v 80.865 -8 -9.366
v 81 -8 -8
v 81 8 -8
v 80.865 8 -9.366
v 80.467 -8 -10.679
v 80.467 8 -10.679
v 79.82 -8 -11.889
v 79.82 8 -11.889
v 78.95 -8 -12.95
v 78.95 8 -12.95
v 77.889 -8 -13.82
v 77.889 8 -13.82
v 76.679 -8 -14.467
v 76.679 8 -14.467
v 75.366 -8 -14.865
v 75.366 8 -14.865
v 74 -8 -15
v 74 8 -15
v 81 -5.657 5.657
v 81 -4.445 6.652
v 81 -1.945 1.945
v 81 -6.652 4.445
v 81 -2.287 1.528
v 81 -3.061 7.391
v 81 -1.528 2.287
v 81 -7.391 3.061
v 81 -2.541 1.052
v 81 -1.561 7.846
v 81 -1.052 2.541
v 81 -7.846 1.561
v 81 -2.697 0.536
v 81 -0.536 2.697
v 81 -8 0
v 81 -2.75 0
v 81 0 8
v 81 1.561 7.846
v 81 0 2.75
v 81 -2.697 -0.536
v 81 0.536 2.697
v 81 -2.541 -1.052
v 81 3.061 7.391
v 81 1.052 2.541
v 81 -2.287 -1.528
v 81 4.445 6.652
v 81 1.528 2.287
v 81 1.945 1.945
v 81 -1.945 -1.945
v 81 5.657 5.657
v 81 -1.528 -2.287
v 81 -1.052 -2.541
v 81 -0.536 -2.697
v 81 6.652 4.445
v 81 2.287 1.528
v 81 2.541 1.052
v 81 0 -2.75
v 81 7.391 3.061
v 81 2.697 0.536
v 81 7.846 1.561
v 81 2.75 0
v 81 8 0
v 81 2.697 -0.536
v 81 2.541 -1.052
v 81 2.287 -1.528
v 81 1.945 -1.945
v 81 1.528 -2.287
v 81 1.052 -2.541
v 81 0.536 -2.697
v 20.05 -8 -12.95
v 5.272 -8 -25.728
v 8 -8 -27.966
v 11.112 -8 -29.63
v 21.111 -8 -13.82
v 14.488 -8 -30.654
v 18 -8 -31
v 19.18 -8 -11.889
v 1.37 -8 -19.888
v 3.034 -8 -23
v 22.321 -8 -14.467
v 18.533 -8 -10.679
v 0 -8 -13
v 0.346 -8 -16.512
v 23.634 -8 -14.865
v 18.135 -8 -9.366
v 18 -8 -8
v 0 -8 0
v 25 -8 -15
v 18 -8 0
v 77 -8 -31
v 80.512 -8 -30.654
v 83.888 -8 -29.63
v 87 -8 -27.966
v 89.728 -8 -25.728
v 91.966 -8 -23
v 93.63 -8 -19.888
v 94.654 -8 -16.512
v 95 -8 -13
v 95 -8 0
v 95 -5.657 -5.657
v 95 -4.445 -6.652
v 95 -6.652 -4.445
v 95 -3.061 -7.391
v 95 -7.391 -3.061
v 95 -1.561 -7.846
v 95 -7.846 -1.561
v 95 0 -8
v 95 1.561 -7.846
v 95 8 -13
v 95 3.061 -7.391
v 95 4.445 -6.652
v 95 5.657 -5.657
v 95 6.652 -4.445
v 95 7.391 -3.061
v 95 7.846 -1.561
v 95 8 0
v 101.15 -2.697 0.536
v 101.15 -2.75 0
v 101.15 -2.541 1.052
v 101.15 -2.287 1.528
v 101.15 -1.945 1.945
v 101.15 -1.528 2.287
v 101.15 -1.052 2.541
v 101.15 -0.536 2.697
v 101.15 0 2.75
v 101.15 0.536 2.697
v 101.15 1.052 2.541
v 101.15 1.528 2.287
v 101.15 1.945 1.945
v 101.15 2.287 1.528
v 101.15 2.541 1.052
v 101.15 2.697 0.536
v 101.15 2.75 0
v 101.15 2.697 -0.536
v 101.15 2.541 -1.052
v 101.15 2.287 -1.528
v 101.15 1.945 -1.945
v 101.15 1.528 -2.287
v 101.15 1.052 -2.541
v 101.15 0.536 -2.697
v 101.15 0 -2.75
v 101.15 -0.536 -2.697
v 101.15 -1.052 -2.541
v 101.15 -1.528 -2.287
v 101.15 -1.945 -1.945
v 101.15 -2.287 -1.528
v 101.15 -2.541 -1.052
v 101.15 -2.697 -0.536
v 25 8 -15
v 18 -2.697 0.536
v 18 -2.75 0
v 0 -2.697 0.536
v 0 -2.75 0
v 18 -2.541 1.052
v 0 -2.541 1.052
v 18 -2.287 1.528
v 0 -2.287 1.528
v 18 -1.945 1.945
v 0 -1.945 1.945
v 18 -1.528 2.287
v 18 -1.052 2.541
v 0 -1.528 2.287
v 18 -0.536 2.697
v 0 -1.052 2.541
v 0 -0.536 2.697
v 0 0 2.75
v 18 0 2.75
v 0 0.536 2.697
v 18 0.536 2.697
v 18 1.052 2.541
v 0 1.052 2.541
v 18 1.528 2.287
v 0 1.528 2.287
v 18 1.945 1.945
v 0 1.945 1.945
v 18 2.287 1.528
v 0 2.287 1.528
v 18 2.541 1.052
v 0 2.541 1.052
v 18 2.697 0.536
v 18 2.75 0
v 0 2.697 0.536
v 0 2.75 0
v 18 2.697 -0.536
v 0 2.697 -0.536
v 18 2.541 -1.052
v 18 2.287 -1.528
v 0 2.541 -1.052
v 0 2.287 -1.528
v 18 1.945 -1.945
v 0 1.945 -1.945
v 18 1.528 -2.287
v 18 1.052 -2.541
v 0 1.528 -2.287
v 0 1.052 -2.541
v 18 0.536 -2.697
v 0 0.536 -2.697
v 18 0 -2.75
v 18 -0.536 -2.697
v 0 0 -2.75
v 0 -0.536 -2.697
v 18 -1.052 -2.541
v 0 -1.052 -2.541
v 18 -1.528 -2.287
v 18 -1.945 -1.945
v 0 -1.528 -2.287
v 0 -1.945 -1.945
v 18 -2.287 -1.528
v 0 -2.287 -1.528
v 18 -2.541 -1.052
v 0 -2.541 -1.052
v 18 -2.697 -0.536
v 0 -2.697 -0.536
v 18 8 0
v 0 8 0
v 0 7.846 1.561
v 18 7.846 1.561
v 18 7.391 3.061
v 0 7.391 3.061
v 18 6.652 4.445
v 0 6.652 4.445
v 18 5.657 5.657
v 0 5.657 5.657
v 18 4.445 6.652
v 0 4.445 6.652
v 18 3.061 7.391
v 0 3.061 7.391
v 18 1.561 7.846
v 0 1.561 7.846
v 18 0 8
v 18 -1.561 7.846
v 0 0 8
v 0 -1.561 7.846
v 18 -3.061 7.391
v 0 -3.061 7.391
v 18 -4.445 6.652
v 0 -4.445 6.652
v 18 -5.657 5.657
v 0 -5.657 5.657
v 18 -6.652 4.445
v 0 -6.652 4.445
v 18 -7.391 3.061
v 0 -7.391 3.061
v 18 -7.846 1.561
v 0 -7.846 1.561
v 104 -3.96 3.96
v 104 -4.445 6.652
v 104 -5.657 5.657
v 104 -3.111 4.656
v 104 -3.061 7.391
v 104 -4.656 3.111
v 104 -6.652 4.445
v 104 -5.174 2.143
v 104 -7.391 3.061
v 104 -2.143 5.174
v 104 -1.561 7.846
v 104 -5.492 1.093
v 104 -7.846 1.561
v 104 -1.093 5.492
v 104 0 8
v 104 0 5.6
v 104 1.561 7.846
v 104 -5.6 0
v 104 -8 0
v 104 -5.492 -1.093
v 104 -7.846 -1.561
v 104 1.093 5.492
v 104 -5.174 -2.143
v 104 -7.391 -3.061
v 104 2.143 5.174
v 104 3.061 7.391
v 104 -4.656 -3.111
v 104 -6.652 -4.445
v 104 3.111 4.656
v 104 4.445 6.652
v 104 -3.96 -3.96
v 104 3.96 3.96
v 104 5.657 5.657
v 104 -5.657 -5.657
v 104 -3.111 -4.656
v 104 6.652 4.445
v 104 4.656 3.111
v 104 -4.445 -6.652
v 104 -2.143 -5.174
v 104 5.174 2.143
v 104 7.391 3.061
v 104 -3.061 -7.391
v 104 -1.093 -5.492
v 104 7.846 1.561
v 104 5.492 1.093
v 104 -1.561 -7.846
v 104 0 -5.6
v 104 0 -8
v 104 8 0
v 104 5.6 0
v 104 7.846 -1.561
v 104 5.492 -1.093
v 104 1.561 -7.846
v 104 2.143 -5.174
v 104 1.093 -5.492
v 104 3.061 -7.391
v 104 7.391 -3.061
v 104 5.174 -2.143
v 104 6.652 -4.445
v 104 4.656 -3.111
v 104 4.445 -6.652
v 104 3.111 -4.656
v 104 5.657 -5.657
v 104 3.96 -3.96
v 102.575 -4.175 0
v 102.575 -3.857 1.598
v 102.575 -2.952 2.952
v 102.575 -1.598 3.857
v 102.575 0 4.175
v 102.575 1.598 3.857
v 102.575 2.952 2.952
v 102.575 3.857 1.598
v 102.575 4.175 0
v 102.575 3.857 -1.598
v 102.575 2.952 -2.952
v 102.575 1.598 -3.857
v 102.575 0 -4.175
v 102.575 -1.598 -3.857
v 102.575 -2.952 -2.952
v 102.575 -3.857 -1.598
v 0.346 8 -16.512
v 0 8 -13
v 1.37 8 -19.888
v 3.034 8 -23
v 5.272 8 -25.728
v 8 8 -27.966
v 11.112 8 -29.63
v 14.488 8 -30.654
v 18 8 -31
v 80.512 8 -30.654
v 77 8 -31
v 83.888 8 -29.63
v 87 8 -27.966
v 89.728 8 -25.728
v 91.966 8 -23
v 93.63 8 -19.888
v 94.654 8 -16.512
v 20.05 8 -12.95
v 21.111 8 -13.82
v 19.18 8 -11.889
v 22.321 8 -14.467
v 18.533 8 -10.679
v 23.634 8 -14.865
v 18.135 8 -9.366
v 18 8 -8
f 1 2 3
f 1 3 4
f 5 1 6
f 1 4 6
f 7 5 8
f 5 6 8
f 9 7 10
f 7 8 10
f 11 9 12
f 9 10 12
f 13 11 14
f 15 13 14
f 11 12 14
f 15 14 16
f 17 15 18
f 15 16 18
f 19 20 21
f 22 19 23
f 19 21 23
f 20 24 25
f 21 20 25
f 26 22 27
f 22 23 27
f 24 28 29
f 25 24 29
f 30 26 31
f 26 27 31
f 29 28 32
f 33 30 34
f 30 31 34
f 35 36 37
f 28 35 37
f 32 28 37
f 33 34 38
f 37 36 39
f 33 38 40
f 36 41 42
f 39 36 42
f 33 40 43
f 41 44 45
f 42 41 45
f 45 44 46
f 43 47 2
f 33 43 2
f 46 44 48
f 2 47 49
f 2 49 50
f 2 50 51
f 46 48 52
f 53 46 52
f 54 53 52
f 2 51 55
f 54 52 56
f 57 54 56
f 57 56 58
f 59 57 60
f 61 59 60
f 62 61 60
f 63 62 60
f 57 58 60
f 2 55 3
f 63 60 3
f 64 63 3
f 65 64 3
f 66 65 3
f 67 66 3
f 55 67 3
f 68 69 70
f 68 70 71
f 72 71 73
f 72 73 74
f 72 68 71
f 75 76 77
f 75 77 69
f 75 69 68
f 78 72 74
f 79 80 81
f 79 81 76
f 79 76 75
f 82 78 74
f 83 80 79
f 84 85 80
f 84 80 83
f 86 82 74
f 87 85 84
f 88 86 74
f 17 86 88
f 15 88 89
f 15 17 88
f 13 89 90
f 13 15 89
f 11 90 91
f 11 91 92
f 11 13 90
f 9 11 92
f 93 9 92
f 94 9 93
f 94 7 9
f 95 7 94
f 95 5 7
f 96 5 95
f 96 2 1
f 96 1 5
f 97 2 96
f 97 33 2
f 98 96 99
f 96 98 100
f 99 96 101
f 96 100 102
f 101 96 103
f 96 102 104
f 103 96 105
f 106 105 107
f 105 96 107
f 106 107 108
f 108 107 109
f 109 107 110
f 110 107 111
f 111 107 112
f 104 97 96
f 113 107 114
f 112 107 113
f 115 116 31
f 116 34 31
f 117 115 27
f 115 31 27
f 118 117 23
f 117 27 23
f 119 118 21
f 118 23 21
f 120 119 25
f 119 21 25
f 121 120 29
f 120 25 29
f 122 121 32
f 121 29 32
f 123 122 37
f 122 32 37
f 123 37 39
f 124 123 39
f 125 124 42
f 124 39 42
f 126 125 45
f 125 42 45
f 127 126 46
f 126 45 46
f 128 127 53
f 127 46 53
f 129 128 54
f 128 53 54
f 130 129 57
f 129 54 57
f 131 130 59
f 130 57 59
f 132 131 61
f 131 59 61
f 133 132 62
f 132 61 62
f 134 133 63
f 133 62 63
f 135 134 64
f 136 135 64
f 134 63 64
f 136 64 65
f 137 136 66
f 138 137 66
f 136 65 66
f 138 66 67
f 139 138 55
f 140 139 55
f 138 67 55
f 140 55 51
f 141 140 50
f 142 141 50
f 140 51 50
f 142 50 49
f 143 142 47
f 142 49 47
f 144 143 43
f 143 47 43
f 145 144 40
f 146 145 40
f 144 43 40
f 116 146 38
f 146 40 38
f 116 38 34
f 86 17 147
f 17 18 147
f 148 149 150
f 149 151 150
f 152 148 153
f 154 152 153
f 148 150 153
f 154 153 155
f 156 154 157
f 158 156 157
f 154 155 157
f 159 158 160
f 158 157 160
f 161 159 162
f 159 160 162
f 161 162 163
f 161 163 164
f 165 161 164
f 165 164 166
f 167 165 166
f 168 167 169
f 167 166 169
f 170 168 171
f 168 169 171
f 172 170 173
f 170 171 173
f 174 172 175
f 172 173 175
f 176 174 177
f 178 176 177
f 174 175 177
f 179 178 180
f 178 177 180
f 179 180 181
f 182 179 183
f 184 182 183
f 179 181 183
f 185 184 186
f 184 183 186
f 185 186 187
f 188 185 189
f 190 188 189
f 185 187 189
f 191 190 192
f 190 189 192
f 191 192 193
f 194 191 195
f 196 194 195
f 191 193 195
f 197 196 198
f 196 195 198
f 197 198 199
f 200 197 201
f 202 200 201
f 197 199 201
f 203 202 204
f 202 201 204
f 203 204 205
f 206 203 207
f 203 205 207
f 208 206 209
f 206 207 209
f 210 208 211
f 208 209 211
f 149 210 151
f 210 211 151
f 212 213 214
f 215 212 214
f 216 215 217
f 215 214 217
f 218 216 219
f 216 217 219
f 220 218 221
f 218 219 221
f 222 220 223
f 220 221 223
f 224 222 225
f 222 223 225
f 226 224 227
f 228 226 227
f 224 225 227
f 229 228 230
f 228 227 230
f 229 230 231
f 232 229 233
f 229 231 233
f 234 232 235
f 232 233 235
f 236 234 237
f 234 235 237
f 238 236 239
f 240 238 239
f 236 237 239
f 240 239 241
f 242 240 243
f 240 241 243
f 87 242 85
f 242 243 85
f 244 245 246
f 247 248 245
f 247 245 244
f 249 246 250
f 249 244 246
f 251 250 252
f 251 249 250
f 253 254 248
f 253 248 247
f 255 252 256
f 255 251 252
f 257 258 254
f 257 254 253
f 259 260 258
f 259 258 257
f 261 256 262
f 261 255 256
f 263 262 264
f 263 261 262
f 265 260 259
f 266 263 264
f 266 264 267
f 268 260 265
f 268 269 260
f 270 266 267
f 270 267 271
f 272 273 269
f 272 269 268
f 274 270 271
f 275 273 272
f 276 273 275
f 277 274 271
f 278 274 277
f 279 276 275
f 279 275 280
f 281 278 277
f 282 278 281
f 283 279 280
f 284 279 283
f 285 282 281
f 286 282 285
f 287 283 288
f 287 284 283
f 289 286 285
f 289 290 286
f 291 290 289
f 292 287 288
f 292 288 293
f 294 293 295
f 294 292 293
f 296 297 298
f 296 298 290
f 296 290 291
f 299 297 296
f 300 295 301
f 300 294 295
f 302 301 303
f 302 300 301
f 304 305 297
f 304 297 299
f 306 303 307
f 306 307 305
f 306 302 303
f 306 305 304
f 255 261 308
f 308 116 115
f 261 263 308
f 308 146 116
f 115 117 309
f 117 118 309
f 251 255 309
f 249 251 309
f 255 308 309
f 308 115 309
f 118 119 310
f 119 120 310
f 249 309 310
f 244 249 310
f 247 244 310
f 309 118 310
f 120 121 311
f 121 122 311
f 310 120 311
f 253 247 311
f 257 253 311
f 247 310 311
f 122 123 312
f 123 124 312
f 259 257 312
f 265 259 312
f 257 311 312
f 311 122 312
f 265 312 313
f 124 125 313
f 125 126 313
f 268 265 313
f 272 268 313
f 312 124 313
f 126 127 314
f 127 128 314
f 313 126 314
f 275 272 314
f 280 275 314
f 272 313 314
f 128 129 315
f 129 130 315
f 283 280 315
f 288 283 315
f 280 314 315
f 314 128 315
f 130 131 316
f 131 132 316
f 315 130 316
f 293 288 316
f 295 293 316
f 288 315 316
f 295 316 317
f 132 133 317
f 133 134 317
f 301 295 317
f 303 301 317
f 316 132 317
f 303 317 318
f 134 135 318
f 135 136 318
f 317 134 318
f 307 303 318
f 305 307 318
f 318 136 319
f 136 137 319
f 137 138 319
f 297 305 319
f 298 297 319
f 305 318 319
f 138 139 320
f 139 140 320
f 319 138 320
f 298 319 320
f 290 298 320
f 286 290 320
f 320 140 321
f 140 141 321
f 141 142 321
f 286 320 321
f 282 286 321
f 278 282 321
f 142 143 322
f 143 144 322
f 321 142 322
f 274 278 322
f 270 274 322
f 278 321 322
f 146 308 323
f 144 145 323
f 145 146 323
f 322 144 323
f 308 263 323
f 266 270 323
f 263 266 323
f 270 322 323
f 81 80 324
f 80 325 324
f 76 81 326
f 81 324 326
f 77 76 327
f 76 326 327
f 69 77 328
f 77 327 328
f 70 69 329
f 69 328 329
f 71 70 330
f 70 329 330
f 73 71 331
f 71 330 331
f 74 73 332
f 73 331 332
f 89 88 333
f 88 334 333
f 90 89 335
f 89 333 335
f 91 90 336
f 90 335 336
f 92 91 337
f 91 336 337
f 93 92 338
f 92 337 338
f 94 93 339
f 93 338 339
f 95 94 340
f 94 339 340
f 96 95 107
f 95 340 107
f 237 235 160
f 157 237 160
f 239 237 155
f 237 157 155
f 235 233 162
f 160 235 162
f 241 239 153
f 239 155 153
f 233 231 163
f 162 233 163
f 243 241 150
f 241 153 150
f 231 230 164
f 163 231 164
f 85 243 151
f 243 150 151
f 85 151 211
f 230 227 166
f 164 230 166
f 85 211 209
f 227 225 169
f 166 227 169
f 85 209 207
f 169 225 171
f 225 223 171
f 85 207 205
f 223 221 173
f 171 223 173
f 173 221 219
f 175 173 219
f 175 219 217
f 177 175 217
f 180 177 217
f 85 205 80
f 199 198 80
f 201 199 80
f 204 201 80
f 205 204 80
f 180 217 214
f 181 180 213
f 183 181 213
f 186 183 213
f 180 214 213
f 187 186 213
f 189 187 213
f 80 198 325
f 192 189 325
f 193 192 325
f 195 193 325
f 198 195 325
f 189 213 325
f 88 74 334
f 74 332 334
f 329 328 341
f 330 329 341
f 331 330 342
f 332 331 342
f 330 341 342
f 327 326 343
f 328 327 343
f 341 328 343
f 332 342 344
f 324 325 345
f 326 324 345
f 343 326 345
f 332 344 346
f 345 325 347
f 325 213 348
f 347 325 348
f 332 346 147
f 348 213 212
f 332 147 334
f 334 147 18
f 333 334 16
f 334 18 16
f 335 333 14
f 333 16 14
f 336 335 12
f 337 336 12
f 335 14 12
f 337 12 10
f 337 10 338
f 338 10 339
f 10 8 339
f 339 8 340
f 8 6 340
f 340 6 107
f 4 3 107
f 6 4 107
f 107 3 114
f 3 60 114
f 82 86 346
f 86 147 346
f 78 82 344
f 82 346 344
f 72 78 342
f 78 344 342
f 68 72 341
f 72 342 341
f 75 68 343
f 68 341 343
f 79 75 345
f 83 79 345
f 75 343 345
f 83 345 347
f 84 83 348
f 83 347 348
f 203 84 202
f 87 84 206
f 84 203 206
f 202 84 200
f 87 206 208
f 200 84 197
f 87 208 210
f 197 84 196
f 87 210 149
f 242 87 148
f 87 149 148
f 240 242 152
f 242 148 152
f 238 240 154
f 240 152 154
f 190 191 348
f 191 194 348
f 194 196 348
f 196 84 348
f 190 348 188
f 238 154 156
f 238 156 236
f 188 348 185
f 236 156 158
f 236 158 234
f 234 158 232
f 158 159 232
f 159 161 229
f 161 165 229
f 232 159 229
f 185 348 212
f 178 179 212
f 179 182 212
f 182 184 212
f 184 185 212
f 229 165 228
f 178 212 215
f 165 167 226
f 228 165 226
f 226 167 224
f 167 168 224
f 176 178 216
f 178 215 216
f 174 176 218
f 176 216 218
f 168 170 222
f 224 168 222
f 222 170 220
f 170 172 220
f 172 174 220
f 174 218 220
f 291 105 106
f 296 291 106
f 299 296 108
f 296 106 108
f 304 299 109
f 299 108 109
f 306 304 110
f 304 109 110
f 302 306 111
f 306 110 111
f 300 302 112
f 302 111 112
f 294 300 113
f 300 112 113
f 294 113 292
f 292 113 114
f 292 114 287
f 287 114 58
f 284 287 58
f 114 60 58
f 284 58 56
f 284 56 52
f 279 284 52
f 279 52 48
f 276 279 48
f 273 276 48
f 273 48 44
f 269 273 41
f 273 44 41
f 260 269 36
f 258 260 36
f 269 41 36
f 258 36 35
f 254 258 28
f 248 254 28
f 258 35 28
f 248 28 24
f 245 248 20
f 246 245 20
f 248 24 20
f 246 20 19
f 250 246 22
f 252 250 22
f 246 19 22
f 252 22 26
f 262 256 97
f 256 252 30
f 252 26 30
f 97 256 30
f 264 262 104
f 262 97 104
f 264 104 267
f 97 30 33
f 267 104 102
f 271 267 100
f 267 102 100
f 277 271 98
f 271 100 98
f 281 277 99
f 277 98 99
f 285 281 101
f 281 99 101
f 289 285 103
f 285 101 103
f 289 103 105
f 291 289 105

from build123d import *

# Parameters (mm, degrees)
SKETCH1_R                                       = 8
BOSS_EXTRUDE1_DEPTH                             = 18
SKETCH3_R                                       = 8
BOSS_EXTRUDE2_DEPTH                             = 23
BOSS_EXTRUDE3_DEPTH                             = 8
CSK_FOR_M5_FLAT_HEAD_MACHINE_SCREW1_D           = 5.5
CSK_FOR_M5_FLAT_HEAD_MACHINE_SCREW1_CSINK_D     = 11.2
CSK_FOR_M5_FLAT_HEAD_MACHINE_SCREW1_CSINK_ANGLE = 90


with BuildPart() as part:
    # Sketch1 → Boss-Extrude1 (new body)
    with BuildSketch(Plane.YZ):
        Circle(SKETCH1_R)
    extrude(amount=BOSS_EXTRUDE1_DEPTH)



with BuildPart() as body_2:
    # Sketch3 → Boss-Extrude2 (new body)
    with BuildSketch(Plane(origin=(81, 0, 0), x_dir=(0, 0, -1), z_dir=(1, 0, 0))):
        Circle(SKETCH3_R)
    extrude(amount=BOSS_EXTRUDE2_DEPTH)


with BuildPart() as part_1:
    add(part.part)

    add(body_2.part)  # Boss-Extrude3 merges body 2
    # Sketch7 → Boss-Extrude3 (add, symmetric)
    with BuildSketch(Plane(origin=(0, 0, 0), x_dir=(-1, 0, 0), z_dir=(0, 1, 0))):
        with BuildLine():
            Line((0, 0), (0, -13))
            ThreePointArc((0, -13), (-5.272077939, -25.727922061), (-18, -31))
            Line((-18, -31), (-77, -31))
            ThreePointArc((-77, -31), (-89.727922061, -25.727922061), (-95, -13))
            Line((-95, -13), (-95, 0))
            Line((-95, 0), (-81, 0))
            Line((-81, 0), (-81, -8))
            ThreePointArc((-81, -8), (-78.949747468, -12.949747468), (-74, -15))
            Line((-74, -15), (-25, -15))
            ThreePointArc((-25, -15), (-20.050252532, -12.949747468), (-18, -8))
            Line((-18, -8), (-18, 0))
            Line((-18, 0), (0, 0))
        make_face()
    extrude(amount=BOSS_EXTRUDE3_DEPTH, both=True)

    # CSK for M5 Flat Head Machine Screw1 (through all)
    with Locations(Plane.YZ.offset(104)):
        with Locations((0, 0)):
            CounterSinkHole(CSK_FOR_M5_FLAT_HEAD_MACHINE_SCREW1_D / 2, CSK_FOR_M5_FLAT_HEAD_MACHINE_SCREW1_CSINK_D / 2, counter_sink_angle=CSK_FOR_M5_FLAT_HEAD_MACHINE_SCREW1_CSINK_ANGLE)


solid = part_1.part
